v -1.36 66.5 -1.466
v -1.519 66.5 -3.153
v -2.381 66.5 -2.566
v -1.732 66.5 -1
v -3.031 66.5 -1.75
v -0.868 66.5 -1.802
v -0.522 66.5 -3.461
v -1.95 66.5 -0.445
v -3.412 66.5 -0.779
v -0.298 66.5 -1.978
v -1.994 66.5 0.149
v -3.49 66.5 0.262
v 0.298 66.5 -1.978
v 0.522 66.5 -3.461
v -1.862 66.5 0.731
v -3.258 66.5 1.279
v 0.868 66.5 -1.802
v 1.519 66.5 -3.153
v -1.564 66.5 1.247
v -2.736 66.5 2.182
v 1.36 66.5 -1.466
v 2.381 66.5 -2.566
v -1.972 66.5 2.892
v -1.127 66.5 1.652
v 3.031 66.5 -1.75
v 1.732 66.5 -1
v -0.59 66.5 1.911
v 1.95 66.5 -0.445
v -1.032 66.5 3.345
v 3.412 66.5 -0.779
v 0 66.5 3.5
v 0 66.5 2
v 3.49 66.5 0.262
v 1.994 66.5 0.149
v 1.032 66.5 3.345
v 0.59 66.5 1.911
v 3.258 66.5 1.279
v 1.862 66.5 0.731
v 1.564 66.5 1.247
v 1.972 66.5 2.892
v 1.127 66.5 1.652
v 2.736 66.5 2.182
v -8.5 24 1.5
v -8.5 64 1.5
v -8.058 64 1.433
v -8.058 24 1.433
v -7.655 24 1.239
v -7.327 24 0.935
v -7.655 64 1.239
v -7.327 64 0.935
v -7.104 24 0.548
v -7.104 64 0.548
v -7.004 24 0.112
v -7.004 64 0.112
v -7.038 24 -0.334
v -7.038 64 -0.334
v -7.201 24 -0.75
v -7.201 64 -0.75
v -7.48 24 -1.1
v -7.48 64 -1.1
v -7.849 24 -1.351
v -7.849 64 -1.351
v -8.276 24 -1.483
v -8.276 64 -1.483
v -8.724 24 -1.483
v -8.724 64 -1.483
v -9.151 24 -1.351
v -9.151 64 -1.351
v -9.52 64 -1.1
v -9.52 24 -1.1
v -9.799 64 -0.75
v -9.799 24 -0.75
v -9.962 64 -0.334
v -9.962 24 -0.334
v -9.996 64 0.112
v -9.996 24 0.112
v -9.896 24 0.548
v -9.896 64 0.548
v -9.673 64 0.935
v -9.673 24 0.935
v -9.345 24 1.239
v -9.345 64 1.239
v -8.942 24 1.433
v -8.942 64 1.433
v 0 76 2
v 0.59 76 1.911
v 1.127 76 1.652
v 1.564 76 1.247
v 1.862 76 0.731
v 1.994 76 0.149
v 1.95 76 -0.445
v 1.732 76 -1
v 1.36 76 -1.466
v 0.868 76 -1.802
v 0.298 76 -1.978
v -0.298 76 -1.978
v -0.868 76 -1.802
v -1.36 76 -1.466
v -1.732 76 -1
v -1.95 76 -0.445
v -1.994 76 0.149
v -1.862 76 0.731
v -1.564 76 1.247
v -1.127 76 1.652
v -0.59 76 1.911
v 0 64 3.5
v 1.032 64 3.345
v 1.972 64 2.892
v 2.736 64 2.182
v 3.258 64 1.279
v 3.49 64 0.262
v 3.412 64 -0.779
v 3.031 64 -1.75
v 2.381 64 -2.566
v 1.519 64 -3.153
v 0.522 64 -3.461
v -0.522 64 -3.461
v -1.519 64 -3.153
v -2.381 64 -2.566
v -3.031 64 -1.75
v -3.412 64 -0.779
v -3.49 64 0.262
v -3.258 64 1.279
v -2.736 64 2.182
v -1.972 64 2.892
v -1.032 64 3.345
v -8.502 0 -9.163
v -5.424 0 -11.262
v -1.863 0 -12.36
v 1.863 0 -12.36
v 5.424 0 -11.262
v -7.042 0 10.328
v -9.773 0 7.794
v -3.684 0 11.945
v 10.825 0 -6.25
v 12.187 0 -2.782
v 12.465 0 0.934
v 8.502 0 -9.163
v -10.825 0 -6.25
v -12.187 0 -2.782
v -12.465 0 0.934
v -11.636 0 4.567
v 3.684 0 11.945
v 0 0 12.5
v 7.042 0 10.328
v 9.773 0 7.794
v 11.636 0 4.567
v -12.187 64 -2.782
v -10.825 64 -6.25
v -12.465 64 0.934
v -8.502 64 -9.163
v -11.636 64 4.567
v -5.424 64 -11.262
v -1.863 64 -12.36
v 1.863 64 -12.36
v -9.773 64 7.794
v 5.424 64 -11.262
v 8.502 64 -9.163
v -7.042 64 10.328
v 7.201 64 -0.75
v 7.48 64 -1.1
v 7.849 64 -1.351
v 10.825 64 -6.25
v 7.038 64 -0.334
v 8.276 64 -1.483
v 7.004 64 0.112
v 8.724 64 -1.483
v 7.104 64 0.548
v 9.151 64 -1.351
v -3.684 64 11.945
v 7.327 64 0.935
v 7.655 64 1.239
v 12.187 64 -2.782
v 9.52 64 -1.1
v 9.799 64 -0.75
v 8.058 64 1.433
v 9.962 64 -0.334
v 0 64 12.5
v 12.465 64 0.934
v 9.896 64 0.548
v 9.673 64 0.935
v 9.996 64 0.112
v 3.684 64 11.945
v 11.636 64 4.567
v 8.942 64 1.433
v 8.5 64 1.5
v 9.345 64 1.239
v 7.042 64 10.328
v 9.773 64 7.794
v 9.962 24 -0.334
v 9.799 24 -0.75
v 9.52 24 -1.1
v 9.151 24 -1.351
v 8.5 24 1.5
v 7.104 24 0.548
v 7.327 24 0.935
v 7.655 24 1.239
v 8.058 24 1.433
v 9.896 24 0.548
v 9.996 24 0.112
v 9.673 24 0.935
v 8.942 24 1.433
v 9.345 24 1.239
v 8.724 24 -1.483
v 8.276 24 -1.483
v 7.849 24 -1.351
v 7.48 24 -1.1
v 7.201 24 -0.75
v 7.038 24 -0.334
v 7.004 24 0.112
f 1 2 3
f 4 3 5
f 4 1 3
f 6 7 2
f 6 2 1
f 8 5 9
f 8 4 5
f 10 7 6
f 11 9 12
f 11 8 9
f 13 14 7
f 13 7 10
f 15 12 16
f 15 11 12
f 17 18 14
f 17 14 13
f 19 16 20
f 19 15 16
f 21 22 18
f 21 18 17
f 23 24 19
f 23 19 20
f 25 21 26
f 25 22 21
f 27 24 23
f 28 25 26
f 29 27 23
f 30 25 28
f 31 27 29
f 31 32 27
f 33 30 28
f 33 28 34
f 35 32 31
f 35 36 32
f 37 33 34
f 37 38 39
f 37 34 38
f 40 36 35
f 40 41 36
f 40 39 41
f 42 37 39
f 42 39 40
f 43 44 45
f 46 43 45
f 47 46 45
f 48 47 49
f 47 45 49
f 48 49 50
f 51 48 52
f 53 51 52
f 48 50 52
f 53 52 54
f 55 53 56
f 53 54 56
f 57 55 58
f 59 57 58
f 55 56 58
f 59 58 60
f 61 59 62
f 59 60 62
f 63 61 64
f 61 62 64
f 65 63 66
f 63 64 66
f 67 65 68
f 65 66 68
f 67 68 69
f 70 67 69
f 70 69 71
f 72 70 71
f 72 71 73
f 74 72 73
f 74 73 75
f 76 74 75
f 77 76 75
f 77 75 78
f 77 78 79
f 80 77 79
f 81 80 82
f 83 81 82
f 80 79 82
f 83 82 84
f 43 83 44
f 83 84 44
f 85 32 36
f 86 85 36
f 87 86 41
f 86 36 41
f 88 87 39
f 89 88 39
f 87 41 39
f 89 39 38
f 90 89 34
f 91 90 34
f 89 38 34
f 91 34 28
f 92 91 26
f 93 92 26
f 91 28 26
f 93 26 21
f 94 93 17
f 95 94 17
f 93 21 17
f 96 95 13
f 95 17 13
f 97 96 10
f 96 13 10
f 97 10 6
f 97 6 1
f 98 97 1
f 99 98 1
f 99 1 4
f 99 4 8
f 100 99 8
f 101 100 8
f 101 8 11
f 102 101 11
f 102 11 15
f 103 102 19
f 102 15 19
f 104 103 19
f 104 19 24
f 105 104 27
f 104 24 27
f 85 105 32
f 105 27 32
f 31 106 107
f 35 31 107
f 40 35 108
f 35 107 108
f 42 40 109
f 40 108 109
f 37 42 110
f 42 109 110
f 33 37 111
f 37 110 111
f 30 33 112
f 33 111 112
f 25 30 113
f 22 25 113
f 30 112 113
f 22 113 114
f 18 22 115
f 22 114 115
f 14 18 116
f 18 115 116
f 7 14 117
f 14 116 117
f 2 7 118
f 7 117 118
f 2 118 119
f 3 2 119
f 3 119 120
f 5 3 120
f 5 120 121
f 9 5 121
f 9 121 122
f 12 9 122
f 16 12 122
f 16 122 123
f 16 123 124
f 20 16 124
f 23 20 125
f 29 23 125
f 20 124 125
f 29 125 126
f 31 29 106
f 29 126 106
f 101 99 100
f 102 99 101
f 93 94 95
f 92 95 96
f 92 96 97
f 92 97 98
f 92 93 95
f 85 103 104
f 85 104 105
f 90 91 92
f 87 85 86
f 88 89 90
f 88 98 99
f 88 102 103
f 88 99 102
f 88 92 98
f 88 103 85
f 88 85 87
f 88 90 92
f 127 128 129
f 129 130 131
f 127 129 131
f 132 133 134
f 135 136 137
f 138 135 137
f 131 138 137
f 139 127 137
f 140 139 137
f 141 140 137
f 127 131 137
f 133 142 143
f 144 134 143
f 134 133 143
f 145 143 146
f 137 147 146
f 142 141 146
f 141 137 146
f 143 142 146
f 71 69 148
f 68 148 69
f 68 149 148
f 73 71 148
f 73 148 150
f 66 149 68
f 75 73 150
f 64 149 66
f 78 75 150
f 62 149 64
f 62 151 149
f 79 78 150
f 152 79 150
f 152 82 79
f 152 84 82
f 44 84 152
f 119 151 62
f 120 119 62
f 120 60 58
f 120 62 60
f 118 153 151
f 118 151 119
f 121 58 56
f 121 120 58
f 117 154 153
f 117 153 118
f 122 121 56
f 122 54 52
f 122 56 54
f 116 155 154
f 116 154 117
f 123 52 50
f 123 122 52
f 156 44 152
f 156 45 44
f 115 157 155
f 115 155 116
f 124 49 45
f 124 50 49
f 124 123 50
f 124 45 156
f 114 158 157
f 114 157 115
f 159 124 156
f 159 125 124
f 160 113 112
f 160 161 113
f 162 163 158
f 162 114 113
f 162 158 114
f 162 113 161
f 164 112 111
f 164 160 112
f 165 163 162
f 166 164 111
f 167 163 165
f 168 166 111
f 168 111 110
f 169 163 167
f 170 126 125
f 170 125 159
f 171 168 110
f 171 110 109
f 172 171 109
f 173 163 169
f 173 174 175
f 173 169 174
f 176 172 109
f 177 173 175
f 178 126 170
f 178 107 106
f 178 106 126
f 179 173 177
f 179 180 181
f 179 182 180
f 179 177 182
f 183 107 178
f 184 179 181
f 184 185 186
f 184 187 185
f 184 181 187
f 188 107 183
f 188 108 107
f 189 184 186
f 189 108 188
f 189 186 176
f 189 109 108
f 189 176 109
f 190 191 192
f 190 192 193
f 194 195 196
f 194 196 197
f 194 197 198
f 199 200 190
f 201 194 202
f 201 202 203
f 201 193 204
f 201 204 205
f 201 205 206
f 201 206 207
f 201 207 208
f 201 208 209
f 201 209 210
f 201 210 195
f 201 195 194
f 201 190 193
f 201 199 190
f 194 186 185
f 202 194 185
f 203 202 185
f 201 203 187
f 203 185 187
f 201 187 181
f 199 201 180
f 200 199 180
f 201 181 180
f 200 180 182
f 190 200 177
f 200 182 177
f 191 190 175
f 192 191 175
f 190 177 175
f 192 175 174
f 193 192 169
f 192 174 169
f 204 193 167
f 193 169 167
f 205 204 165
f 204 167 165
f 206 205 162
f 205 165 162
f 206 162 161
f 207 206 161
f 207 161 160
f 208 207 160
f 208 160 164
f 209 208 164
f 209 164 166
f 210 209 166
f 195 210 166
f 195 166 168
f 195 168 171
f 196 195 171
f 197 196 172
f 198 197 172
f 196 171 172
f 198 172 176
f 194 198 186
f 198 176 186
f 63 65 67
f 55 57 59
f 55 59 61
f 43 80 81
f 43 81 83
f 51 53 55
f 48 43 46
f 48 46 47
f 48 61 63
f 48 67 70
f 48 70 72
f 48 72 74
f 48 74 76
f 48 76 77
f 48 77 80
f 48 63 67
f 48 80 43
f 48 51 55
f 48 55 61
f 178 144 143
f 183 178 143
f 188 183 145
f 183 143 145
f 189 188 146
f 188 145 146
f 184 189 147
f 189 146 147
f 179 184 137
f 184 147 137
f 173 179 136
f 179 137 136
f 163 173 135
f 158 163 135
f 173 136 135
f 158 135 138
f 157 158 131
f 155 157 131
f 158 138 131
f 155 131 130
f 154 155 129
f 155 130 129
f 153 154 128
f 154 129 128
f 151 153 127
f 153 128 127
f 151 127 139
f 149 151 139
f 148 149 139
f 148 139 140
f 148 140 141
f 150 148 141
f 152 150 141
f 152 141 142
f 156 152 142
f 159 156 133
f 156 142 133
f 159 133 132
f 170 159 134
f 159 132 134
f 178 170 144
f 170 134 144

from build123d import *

# Parameters (mm, degrees)
CROQUIS1_R              = 12.5
SALIENTE_EXTRUIR1_DEPTH = 64
CROQUIS2_R              = 1.5
CORTAR_EXTRUIR1_DEPTH   = 40
CROQUIS3_R              = 3.5
SALIENTE_EXTRUIR2_DEPTH = 2.5
CROQUIS4_R              = 2
SALIENTE_EXTRUIR3_DEPTH = 9.5


with BuildPart() as part:
    # Croquis1 → Saliente-Extruir1 (new body)
    with BuildSketch(Plane(origin=(0, 0, 0), x_dir=(1, 0, 0), z_dir=(0, 1, 0))):
        with Locations(Location((0, 0, 0), (0, 0, 270))):
            Circle(CROQUIS1_R)
    extrude(amount=SALIENTE_EXTRUIR1_DEPTH)

    # Croquis2 → Cortar-Extruir1 (cut)
    with BuildSketch(Plane(origin=(0, 64, 0), x_dir=(1, 0, 0), z_dir=(0, 1, 0))):
        with Locations(Location((-8.5, 0, 0), (0, 0, 270))):
            Circle(CROQUIS2_R)
        with Locations(Location((8.5, 0, 0), (0, 0, 270))):
            Circle(CROQUIS2_R)
    extrude(amount=-CORTAR_EXTRUIR1_DEPTH, mode=Mode.SUBTRACT)

    # Croquis3 → Saliente-Extruir2 (add)
    with BuildSketch(Plane(origin=(0, 64, 0), x_dir=(1, 0, 0), z_dir=(0, 1, 0))):
        with Locations(Location((0, 0, 0), (0, 0, 270))):
            Circle(CROQUIS3_R)
    extrude(amount=SALIENTE_EXTRUIR2_DEPTH)

    # Croquis4 → Saliente-Extruir3 (add)
    with BuildSketch(Plane(origin=(0, 66.5, 0), x_dir=(1, 0, 0), z_dir=(0, 1, 0))):
        with Locations(Location((0, 0, 0), (0, 0, 270))):
            Circle(CROQUIS4_R)
    extrude(amount=SALIENTE_EXTRUIR3_DEPTH)


solid = part.part
